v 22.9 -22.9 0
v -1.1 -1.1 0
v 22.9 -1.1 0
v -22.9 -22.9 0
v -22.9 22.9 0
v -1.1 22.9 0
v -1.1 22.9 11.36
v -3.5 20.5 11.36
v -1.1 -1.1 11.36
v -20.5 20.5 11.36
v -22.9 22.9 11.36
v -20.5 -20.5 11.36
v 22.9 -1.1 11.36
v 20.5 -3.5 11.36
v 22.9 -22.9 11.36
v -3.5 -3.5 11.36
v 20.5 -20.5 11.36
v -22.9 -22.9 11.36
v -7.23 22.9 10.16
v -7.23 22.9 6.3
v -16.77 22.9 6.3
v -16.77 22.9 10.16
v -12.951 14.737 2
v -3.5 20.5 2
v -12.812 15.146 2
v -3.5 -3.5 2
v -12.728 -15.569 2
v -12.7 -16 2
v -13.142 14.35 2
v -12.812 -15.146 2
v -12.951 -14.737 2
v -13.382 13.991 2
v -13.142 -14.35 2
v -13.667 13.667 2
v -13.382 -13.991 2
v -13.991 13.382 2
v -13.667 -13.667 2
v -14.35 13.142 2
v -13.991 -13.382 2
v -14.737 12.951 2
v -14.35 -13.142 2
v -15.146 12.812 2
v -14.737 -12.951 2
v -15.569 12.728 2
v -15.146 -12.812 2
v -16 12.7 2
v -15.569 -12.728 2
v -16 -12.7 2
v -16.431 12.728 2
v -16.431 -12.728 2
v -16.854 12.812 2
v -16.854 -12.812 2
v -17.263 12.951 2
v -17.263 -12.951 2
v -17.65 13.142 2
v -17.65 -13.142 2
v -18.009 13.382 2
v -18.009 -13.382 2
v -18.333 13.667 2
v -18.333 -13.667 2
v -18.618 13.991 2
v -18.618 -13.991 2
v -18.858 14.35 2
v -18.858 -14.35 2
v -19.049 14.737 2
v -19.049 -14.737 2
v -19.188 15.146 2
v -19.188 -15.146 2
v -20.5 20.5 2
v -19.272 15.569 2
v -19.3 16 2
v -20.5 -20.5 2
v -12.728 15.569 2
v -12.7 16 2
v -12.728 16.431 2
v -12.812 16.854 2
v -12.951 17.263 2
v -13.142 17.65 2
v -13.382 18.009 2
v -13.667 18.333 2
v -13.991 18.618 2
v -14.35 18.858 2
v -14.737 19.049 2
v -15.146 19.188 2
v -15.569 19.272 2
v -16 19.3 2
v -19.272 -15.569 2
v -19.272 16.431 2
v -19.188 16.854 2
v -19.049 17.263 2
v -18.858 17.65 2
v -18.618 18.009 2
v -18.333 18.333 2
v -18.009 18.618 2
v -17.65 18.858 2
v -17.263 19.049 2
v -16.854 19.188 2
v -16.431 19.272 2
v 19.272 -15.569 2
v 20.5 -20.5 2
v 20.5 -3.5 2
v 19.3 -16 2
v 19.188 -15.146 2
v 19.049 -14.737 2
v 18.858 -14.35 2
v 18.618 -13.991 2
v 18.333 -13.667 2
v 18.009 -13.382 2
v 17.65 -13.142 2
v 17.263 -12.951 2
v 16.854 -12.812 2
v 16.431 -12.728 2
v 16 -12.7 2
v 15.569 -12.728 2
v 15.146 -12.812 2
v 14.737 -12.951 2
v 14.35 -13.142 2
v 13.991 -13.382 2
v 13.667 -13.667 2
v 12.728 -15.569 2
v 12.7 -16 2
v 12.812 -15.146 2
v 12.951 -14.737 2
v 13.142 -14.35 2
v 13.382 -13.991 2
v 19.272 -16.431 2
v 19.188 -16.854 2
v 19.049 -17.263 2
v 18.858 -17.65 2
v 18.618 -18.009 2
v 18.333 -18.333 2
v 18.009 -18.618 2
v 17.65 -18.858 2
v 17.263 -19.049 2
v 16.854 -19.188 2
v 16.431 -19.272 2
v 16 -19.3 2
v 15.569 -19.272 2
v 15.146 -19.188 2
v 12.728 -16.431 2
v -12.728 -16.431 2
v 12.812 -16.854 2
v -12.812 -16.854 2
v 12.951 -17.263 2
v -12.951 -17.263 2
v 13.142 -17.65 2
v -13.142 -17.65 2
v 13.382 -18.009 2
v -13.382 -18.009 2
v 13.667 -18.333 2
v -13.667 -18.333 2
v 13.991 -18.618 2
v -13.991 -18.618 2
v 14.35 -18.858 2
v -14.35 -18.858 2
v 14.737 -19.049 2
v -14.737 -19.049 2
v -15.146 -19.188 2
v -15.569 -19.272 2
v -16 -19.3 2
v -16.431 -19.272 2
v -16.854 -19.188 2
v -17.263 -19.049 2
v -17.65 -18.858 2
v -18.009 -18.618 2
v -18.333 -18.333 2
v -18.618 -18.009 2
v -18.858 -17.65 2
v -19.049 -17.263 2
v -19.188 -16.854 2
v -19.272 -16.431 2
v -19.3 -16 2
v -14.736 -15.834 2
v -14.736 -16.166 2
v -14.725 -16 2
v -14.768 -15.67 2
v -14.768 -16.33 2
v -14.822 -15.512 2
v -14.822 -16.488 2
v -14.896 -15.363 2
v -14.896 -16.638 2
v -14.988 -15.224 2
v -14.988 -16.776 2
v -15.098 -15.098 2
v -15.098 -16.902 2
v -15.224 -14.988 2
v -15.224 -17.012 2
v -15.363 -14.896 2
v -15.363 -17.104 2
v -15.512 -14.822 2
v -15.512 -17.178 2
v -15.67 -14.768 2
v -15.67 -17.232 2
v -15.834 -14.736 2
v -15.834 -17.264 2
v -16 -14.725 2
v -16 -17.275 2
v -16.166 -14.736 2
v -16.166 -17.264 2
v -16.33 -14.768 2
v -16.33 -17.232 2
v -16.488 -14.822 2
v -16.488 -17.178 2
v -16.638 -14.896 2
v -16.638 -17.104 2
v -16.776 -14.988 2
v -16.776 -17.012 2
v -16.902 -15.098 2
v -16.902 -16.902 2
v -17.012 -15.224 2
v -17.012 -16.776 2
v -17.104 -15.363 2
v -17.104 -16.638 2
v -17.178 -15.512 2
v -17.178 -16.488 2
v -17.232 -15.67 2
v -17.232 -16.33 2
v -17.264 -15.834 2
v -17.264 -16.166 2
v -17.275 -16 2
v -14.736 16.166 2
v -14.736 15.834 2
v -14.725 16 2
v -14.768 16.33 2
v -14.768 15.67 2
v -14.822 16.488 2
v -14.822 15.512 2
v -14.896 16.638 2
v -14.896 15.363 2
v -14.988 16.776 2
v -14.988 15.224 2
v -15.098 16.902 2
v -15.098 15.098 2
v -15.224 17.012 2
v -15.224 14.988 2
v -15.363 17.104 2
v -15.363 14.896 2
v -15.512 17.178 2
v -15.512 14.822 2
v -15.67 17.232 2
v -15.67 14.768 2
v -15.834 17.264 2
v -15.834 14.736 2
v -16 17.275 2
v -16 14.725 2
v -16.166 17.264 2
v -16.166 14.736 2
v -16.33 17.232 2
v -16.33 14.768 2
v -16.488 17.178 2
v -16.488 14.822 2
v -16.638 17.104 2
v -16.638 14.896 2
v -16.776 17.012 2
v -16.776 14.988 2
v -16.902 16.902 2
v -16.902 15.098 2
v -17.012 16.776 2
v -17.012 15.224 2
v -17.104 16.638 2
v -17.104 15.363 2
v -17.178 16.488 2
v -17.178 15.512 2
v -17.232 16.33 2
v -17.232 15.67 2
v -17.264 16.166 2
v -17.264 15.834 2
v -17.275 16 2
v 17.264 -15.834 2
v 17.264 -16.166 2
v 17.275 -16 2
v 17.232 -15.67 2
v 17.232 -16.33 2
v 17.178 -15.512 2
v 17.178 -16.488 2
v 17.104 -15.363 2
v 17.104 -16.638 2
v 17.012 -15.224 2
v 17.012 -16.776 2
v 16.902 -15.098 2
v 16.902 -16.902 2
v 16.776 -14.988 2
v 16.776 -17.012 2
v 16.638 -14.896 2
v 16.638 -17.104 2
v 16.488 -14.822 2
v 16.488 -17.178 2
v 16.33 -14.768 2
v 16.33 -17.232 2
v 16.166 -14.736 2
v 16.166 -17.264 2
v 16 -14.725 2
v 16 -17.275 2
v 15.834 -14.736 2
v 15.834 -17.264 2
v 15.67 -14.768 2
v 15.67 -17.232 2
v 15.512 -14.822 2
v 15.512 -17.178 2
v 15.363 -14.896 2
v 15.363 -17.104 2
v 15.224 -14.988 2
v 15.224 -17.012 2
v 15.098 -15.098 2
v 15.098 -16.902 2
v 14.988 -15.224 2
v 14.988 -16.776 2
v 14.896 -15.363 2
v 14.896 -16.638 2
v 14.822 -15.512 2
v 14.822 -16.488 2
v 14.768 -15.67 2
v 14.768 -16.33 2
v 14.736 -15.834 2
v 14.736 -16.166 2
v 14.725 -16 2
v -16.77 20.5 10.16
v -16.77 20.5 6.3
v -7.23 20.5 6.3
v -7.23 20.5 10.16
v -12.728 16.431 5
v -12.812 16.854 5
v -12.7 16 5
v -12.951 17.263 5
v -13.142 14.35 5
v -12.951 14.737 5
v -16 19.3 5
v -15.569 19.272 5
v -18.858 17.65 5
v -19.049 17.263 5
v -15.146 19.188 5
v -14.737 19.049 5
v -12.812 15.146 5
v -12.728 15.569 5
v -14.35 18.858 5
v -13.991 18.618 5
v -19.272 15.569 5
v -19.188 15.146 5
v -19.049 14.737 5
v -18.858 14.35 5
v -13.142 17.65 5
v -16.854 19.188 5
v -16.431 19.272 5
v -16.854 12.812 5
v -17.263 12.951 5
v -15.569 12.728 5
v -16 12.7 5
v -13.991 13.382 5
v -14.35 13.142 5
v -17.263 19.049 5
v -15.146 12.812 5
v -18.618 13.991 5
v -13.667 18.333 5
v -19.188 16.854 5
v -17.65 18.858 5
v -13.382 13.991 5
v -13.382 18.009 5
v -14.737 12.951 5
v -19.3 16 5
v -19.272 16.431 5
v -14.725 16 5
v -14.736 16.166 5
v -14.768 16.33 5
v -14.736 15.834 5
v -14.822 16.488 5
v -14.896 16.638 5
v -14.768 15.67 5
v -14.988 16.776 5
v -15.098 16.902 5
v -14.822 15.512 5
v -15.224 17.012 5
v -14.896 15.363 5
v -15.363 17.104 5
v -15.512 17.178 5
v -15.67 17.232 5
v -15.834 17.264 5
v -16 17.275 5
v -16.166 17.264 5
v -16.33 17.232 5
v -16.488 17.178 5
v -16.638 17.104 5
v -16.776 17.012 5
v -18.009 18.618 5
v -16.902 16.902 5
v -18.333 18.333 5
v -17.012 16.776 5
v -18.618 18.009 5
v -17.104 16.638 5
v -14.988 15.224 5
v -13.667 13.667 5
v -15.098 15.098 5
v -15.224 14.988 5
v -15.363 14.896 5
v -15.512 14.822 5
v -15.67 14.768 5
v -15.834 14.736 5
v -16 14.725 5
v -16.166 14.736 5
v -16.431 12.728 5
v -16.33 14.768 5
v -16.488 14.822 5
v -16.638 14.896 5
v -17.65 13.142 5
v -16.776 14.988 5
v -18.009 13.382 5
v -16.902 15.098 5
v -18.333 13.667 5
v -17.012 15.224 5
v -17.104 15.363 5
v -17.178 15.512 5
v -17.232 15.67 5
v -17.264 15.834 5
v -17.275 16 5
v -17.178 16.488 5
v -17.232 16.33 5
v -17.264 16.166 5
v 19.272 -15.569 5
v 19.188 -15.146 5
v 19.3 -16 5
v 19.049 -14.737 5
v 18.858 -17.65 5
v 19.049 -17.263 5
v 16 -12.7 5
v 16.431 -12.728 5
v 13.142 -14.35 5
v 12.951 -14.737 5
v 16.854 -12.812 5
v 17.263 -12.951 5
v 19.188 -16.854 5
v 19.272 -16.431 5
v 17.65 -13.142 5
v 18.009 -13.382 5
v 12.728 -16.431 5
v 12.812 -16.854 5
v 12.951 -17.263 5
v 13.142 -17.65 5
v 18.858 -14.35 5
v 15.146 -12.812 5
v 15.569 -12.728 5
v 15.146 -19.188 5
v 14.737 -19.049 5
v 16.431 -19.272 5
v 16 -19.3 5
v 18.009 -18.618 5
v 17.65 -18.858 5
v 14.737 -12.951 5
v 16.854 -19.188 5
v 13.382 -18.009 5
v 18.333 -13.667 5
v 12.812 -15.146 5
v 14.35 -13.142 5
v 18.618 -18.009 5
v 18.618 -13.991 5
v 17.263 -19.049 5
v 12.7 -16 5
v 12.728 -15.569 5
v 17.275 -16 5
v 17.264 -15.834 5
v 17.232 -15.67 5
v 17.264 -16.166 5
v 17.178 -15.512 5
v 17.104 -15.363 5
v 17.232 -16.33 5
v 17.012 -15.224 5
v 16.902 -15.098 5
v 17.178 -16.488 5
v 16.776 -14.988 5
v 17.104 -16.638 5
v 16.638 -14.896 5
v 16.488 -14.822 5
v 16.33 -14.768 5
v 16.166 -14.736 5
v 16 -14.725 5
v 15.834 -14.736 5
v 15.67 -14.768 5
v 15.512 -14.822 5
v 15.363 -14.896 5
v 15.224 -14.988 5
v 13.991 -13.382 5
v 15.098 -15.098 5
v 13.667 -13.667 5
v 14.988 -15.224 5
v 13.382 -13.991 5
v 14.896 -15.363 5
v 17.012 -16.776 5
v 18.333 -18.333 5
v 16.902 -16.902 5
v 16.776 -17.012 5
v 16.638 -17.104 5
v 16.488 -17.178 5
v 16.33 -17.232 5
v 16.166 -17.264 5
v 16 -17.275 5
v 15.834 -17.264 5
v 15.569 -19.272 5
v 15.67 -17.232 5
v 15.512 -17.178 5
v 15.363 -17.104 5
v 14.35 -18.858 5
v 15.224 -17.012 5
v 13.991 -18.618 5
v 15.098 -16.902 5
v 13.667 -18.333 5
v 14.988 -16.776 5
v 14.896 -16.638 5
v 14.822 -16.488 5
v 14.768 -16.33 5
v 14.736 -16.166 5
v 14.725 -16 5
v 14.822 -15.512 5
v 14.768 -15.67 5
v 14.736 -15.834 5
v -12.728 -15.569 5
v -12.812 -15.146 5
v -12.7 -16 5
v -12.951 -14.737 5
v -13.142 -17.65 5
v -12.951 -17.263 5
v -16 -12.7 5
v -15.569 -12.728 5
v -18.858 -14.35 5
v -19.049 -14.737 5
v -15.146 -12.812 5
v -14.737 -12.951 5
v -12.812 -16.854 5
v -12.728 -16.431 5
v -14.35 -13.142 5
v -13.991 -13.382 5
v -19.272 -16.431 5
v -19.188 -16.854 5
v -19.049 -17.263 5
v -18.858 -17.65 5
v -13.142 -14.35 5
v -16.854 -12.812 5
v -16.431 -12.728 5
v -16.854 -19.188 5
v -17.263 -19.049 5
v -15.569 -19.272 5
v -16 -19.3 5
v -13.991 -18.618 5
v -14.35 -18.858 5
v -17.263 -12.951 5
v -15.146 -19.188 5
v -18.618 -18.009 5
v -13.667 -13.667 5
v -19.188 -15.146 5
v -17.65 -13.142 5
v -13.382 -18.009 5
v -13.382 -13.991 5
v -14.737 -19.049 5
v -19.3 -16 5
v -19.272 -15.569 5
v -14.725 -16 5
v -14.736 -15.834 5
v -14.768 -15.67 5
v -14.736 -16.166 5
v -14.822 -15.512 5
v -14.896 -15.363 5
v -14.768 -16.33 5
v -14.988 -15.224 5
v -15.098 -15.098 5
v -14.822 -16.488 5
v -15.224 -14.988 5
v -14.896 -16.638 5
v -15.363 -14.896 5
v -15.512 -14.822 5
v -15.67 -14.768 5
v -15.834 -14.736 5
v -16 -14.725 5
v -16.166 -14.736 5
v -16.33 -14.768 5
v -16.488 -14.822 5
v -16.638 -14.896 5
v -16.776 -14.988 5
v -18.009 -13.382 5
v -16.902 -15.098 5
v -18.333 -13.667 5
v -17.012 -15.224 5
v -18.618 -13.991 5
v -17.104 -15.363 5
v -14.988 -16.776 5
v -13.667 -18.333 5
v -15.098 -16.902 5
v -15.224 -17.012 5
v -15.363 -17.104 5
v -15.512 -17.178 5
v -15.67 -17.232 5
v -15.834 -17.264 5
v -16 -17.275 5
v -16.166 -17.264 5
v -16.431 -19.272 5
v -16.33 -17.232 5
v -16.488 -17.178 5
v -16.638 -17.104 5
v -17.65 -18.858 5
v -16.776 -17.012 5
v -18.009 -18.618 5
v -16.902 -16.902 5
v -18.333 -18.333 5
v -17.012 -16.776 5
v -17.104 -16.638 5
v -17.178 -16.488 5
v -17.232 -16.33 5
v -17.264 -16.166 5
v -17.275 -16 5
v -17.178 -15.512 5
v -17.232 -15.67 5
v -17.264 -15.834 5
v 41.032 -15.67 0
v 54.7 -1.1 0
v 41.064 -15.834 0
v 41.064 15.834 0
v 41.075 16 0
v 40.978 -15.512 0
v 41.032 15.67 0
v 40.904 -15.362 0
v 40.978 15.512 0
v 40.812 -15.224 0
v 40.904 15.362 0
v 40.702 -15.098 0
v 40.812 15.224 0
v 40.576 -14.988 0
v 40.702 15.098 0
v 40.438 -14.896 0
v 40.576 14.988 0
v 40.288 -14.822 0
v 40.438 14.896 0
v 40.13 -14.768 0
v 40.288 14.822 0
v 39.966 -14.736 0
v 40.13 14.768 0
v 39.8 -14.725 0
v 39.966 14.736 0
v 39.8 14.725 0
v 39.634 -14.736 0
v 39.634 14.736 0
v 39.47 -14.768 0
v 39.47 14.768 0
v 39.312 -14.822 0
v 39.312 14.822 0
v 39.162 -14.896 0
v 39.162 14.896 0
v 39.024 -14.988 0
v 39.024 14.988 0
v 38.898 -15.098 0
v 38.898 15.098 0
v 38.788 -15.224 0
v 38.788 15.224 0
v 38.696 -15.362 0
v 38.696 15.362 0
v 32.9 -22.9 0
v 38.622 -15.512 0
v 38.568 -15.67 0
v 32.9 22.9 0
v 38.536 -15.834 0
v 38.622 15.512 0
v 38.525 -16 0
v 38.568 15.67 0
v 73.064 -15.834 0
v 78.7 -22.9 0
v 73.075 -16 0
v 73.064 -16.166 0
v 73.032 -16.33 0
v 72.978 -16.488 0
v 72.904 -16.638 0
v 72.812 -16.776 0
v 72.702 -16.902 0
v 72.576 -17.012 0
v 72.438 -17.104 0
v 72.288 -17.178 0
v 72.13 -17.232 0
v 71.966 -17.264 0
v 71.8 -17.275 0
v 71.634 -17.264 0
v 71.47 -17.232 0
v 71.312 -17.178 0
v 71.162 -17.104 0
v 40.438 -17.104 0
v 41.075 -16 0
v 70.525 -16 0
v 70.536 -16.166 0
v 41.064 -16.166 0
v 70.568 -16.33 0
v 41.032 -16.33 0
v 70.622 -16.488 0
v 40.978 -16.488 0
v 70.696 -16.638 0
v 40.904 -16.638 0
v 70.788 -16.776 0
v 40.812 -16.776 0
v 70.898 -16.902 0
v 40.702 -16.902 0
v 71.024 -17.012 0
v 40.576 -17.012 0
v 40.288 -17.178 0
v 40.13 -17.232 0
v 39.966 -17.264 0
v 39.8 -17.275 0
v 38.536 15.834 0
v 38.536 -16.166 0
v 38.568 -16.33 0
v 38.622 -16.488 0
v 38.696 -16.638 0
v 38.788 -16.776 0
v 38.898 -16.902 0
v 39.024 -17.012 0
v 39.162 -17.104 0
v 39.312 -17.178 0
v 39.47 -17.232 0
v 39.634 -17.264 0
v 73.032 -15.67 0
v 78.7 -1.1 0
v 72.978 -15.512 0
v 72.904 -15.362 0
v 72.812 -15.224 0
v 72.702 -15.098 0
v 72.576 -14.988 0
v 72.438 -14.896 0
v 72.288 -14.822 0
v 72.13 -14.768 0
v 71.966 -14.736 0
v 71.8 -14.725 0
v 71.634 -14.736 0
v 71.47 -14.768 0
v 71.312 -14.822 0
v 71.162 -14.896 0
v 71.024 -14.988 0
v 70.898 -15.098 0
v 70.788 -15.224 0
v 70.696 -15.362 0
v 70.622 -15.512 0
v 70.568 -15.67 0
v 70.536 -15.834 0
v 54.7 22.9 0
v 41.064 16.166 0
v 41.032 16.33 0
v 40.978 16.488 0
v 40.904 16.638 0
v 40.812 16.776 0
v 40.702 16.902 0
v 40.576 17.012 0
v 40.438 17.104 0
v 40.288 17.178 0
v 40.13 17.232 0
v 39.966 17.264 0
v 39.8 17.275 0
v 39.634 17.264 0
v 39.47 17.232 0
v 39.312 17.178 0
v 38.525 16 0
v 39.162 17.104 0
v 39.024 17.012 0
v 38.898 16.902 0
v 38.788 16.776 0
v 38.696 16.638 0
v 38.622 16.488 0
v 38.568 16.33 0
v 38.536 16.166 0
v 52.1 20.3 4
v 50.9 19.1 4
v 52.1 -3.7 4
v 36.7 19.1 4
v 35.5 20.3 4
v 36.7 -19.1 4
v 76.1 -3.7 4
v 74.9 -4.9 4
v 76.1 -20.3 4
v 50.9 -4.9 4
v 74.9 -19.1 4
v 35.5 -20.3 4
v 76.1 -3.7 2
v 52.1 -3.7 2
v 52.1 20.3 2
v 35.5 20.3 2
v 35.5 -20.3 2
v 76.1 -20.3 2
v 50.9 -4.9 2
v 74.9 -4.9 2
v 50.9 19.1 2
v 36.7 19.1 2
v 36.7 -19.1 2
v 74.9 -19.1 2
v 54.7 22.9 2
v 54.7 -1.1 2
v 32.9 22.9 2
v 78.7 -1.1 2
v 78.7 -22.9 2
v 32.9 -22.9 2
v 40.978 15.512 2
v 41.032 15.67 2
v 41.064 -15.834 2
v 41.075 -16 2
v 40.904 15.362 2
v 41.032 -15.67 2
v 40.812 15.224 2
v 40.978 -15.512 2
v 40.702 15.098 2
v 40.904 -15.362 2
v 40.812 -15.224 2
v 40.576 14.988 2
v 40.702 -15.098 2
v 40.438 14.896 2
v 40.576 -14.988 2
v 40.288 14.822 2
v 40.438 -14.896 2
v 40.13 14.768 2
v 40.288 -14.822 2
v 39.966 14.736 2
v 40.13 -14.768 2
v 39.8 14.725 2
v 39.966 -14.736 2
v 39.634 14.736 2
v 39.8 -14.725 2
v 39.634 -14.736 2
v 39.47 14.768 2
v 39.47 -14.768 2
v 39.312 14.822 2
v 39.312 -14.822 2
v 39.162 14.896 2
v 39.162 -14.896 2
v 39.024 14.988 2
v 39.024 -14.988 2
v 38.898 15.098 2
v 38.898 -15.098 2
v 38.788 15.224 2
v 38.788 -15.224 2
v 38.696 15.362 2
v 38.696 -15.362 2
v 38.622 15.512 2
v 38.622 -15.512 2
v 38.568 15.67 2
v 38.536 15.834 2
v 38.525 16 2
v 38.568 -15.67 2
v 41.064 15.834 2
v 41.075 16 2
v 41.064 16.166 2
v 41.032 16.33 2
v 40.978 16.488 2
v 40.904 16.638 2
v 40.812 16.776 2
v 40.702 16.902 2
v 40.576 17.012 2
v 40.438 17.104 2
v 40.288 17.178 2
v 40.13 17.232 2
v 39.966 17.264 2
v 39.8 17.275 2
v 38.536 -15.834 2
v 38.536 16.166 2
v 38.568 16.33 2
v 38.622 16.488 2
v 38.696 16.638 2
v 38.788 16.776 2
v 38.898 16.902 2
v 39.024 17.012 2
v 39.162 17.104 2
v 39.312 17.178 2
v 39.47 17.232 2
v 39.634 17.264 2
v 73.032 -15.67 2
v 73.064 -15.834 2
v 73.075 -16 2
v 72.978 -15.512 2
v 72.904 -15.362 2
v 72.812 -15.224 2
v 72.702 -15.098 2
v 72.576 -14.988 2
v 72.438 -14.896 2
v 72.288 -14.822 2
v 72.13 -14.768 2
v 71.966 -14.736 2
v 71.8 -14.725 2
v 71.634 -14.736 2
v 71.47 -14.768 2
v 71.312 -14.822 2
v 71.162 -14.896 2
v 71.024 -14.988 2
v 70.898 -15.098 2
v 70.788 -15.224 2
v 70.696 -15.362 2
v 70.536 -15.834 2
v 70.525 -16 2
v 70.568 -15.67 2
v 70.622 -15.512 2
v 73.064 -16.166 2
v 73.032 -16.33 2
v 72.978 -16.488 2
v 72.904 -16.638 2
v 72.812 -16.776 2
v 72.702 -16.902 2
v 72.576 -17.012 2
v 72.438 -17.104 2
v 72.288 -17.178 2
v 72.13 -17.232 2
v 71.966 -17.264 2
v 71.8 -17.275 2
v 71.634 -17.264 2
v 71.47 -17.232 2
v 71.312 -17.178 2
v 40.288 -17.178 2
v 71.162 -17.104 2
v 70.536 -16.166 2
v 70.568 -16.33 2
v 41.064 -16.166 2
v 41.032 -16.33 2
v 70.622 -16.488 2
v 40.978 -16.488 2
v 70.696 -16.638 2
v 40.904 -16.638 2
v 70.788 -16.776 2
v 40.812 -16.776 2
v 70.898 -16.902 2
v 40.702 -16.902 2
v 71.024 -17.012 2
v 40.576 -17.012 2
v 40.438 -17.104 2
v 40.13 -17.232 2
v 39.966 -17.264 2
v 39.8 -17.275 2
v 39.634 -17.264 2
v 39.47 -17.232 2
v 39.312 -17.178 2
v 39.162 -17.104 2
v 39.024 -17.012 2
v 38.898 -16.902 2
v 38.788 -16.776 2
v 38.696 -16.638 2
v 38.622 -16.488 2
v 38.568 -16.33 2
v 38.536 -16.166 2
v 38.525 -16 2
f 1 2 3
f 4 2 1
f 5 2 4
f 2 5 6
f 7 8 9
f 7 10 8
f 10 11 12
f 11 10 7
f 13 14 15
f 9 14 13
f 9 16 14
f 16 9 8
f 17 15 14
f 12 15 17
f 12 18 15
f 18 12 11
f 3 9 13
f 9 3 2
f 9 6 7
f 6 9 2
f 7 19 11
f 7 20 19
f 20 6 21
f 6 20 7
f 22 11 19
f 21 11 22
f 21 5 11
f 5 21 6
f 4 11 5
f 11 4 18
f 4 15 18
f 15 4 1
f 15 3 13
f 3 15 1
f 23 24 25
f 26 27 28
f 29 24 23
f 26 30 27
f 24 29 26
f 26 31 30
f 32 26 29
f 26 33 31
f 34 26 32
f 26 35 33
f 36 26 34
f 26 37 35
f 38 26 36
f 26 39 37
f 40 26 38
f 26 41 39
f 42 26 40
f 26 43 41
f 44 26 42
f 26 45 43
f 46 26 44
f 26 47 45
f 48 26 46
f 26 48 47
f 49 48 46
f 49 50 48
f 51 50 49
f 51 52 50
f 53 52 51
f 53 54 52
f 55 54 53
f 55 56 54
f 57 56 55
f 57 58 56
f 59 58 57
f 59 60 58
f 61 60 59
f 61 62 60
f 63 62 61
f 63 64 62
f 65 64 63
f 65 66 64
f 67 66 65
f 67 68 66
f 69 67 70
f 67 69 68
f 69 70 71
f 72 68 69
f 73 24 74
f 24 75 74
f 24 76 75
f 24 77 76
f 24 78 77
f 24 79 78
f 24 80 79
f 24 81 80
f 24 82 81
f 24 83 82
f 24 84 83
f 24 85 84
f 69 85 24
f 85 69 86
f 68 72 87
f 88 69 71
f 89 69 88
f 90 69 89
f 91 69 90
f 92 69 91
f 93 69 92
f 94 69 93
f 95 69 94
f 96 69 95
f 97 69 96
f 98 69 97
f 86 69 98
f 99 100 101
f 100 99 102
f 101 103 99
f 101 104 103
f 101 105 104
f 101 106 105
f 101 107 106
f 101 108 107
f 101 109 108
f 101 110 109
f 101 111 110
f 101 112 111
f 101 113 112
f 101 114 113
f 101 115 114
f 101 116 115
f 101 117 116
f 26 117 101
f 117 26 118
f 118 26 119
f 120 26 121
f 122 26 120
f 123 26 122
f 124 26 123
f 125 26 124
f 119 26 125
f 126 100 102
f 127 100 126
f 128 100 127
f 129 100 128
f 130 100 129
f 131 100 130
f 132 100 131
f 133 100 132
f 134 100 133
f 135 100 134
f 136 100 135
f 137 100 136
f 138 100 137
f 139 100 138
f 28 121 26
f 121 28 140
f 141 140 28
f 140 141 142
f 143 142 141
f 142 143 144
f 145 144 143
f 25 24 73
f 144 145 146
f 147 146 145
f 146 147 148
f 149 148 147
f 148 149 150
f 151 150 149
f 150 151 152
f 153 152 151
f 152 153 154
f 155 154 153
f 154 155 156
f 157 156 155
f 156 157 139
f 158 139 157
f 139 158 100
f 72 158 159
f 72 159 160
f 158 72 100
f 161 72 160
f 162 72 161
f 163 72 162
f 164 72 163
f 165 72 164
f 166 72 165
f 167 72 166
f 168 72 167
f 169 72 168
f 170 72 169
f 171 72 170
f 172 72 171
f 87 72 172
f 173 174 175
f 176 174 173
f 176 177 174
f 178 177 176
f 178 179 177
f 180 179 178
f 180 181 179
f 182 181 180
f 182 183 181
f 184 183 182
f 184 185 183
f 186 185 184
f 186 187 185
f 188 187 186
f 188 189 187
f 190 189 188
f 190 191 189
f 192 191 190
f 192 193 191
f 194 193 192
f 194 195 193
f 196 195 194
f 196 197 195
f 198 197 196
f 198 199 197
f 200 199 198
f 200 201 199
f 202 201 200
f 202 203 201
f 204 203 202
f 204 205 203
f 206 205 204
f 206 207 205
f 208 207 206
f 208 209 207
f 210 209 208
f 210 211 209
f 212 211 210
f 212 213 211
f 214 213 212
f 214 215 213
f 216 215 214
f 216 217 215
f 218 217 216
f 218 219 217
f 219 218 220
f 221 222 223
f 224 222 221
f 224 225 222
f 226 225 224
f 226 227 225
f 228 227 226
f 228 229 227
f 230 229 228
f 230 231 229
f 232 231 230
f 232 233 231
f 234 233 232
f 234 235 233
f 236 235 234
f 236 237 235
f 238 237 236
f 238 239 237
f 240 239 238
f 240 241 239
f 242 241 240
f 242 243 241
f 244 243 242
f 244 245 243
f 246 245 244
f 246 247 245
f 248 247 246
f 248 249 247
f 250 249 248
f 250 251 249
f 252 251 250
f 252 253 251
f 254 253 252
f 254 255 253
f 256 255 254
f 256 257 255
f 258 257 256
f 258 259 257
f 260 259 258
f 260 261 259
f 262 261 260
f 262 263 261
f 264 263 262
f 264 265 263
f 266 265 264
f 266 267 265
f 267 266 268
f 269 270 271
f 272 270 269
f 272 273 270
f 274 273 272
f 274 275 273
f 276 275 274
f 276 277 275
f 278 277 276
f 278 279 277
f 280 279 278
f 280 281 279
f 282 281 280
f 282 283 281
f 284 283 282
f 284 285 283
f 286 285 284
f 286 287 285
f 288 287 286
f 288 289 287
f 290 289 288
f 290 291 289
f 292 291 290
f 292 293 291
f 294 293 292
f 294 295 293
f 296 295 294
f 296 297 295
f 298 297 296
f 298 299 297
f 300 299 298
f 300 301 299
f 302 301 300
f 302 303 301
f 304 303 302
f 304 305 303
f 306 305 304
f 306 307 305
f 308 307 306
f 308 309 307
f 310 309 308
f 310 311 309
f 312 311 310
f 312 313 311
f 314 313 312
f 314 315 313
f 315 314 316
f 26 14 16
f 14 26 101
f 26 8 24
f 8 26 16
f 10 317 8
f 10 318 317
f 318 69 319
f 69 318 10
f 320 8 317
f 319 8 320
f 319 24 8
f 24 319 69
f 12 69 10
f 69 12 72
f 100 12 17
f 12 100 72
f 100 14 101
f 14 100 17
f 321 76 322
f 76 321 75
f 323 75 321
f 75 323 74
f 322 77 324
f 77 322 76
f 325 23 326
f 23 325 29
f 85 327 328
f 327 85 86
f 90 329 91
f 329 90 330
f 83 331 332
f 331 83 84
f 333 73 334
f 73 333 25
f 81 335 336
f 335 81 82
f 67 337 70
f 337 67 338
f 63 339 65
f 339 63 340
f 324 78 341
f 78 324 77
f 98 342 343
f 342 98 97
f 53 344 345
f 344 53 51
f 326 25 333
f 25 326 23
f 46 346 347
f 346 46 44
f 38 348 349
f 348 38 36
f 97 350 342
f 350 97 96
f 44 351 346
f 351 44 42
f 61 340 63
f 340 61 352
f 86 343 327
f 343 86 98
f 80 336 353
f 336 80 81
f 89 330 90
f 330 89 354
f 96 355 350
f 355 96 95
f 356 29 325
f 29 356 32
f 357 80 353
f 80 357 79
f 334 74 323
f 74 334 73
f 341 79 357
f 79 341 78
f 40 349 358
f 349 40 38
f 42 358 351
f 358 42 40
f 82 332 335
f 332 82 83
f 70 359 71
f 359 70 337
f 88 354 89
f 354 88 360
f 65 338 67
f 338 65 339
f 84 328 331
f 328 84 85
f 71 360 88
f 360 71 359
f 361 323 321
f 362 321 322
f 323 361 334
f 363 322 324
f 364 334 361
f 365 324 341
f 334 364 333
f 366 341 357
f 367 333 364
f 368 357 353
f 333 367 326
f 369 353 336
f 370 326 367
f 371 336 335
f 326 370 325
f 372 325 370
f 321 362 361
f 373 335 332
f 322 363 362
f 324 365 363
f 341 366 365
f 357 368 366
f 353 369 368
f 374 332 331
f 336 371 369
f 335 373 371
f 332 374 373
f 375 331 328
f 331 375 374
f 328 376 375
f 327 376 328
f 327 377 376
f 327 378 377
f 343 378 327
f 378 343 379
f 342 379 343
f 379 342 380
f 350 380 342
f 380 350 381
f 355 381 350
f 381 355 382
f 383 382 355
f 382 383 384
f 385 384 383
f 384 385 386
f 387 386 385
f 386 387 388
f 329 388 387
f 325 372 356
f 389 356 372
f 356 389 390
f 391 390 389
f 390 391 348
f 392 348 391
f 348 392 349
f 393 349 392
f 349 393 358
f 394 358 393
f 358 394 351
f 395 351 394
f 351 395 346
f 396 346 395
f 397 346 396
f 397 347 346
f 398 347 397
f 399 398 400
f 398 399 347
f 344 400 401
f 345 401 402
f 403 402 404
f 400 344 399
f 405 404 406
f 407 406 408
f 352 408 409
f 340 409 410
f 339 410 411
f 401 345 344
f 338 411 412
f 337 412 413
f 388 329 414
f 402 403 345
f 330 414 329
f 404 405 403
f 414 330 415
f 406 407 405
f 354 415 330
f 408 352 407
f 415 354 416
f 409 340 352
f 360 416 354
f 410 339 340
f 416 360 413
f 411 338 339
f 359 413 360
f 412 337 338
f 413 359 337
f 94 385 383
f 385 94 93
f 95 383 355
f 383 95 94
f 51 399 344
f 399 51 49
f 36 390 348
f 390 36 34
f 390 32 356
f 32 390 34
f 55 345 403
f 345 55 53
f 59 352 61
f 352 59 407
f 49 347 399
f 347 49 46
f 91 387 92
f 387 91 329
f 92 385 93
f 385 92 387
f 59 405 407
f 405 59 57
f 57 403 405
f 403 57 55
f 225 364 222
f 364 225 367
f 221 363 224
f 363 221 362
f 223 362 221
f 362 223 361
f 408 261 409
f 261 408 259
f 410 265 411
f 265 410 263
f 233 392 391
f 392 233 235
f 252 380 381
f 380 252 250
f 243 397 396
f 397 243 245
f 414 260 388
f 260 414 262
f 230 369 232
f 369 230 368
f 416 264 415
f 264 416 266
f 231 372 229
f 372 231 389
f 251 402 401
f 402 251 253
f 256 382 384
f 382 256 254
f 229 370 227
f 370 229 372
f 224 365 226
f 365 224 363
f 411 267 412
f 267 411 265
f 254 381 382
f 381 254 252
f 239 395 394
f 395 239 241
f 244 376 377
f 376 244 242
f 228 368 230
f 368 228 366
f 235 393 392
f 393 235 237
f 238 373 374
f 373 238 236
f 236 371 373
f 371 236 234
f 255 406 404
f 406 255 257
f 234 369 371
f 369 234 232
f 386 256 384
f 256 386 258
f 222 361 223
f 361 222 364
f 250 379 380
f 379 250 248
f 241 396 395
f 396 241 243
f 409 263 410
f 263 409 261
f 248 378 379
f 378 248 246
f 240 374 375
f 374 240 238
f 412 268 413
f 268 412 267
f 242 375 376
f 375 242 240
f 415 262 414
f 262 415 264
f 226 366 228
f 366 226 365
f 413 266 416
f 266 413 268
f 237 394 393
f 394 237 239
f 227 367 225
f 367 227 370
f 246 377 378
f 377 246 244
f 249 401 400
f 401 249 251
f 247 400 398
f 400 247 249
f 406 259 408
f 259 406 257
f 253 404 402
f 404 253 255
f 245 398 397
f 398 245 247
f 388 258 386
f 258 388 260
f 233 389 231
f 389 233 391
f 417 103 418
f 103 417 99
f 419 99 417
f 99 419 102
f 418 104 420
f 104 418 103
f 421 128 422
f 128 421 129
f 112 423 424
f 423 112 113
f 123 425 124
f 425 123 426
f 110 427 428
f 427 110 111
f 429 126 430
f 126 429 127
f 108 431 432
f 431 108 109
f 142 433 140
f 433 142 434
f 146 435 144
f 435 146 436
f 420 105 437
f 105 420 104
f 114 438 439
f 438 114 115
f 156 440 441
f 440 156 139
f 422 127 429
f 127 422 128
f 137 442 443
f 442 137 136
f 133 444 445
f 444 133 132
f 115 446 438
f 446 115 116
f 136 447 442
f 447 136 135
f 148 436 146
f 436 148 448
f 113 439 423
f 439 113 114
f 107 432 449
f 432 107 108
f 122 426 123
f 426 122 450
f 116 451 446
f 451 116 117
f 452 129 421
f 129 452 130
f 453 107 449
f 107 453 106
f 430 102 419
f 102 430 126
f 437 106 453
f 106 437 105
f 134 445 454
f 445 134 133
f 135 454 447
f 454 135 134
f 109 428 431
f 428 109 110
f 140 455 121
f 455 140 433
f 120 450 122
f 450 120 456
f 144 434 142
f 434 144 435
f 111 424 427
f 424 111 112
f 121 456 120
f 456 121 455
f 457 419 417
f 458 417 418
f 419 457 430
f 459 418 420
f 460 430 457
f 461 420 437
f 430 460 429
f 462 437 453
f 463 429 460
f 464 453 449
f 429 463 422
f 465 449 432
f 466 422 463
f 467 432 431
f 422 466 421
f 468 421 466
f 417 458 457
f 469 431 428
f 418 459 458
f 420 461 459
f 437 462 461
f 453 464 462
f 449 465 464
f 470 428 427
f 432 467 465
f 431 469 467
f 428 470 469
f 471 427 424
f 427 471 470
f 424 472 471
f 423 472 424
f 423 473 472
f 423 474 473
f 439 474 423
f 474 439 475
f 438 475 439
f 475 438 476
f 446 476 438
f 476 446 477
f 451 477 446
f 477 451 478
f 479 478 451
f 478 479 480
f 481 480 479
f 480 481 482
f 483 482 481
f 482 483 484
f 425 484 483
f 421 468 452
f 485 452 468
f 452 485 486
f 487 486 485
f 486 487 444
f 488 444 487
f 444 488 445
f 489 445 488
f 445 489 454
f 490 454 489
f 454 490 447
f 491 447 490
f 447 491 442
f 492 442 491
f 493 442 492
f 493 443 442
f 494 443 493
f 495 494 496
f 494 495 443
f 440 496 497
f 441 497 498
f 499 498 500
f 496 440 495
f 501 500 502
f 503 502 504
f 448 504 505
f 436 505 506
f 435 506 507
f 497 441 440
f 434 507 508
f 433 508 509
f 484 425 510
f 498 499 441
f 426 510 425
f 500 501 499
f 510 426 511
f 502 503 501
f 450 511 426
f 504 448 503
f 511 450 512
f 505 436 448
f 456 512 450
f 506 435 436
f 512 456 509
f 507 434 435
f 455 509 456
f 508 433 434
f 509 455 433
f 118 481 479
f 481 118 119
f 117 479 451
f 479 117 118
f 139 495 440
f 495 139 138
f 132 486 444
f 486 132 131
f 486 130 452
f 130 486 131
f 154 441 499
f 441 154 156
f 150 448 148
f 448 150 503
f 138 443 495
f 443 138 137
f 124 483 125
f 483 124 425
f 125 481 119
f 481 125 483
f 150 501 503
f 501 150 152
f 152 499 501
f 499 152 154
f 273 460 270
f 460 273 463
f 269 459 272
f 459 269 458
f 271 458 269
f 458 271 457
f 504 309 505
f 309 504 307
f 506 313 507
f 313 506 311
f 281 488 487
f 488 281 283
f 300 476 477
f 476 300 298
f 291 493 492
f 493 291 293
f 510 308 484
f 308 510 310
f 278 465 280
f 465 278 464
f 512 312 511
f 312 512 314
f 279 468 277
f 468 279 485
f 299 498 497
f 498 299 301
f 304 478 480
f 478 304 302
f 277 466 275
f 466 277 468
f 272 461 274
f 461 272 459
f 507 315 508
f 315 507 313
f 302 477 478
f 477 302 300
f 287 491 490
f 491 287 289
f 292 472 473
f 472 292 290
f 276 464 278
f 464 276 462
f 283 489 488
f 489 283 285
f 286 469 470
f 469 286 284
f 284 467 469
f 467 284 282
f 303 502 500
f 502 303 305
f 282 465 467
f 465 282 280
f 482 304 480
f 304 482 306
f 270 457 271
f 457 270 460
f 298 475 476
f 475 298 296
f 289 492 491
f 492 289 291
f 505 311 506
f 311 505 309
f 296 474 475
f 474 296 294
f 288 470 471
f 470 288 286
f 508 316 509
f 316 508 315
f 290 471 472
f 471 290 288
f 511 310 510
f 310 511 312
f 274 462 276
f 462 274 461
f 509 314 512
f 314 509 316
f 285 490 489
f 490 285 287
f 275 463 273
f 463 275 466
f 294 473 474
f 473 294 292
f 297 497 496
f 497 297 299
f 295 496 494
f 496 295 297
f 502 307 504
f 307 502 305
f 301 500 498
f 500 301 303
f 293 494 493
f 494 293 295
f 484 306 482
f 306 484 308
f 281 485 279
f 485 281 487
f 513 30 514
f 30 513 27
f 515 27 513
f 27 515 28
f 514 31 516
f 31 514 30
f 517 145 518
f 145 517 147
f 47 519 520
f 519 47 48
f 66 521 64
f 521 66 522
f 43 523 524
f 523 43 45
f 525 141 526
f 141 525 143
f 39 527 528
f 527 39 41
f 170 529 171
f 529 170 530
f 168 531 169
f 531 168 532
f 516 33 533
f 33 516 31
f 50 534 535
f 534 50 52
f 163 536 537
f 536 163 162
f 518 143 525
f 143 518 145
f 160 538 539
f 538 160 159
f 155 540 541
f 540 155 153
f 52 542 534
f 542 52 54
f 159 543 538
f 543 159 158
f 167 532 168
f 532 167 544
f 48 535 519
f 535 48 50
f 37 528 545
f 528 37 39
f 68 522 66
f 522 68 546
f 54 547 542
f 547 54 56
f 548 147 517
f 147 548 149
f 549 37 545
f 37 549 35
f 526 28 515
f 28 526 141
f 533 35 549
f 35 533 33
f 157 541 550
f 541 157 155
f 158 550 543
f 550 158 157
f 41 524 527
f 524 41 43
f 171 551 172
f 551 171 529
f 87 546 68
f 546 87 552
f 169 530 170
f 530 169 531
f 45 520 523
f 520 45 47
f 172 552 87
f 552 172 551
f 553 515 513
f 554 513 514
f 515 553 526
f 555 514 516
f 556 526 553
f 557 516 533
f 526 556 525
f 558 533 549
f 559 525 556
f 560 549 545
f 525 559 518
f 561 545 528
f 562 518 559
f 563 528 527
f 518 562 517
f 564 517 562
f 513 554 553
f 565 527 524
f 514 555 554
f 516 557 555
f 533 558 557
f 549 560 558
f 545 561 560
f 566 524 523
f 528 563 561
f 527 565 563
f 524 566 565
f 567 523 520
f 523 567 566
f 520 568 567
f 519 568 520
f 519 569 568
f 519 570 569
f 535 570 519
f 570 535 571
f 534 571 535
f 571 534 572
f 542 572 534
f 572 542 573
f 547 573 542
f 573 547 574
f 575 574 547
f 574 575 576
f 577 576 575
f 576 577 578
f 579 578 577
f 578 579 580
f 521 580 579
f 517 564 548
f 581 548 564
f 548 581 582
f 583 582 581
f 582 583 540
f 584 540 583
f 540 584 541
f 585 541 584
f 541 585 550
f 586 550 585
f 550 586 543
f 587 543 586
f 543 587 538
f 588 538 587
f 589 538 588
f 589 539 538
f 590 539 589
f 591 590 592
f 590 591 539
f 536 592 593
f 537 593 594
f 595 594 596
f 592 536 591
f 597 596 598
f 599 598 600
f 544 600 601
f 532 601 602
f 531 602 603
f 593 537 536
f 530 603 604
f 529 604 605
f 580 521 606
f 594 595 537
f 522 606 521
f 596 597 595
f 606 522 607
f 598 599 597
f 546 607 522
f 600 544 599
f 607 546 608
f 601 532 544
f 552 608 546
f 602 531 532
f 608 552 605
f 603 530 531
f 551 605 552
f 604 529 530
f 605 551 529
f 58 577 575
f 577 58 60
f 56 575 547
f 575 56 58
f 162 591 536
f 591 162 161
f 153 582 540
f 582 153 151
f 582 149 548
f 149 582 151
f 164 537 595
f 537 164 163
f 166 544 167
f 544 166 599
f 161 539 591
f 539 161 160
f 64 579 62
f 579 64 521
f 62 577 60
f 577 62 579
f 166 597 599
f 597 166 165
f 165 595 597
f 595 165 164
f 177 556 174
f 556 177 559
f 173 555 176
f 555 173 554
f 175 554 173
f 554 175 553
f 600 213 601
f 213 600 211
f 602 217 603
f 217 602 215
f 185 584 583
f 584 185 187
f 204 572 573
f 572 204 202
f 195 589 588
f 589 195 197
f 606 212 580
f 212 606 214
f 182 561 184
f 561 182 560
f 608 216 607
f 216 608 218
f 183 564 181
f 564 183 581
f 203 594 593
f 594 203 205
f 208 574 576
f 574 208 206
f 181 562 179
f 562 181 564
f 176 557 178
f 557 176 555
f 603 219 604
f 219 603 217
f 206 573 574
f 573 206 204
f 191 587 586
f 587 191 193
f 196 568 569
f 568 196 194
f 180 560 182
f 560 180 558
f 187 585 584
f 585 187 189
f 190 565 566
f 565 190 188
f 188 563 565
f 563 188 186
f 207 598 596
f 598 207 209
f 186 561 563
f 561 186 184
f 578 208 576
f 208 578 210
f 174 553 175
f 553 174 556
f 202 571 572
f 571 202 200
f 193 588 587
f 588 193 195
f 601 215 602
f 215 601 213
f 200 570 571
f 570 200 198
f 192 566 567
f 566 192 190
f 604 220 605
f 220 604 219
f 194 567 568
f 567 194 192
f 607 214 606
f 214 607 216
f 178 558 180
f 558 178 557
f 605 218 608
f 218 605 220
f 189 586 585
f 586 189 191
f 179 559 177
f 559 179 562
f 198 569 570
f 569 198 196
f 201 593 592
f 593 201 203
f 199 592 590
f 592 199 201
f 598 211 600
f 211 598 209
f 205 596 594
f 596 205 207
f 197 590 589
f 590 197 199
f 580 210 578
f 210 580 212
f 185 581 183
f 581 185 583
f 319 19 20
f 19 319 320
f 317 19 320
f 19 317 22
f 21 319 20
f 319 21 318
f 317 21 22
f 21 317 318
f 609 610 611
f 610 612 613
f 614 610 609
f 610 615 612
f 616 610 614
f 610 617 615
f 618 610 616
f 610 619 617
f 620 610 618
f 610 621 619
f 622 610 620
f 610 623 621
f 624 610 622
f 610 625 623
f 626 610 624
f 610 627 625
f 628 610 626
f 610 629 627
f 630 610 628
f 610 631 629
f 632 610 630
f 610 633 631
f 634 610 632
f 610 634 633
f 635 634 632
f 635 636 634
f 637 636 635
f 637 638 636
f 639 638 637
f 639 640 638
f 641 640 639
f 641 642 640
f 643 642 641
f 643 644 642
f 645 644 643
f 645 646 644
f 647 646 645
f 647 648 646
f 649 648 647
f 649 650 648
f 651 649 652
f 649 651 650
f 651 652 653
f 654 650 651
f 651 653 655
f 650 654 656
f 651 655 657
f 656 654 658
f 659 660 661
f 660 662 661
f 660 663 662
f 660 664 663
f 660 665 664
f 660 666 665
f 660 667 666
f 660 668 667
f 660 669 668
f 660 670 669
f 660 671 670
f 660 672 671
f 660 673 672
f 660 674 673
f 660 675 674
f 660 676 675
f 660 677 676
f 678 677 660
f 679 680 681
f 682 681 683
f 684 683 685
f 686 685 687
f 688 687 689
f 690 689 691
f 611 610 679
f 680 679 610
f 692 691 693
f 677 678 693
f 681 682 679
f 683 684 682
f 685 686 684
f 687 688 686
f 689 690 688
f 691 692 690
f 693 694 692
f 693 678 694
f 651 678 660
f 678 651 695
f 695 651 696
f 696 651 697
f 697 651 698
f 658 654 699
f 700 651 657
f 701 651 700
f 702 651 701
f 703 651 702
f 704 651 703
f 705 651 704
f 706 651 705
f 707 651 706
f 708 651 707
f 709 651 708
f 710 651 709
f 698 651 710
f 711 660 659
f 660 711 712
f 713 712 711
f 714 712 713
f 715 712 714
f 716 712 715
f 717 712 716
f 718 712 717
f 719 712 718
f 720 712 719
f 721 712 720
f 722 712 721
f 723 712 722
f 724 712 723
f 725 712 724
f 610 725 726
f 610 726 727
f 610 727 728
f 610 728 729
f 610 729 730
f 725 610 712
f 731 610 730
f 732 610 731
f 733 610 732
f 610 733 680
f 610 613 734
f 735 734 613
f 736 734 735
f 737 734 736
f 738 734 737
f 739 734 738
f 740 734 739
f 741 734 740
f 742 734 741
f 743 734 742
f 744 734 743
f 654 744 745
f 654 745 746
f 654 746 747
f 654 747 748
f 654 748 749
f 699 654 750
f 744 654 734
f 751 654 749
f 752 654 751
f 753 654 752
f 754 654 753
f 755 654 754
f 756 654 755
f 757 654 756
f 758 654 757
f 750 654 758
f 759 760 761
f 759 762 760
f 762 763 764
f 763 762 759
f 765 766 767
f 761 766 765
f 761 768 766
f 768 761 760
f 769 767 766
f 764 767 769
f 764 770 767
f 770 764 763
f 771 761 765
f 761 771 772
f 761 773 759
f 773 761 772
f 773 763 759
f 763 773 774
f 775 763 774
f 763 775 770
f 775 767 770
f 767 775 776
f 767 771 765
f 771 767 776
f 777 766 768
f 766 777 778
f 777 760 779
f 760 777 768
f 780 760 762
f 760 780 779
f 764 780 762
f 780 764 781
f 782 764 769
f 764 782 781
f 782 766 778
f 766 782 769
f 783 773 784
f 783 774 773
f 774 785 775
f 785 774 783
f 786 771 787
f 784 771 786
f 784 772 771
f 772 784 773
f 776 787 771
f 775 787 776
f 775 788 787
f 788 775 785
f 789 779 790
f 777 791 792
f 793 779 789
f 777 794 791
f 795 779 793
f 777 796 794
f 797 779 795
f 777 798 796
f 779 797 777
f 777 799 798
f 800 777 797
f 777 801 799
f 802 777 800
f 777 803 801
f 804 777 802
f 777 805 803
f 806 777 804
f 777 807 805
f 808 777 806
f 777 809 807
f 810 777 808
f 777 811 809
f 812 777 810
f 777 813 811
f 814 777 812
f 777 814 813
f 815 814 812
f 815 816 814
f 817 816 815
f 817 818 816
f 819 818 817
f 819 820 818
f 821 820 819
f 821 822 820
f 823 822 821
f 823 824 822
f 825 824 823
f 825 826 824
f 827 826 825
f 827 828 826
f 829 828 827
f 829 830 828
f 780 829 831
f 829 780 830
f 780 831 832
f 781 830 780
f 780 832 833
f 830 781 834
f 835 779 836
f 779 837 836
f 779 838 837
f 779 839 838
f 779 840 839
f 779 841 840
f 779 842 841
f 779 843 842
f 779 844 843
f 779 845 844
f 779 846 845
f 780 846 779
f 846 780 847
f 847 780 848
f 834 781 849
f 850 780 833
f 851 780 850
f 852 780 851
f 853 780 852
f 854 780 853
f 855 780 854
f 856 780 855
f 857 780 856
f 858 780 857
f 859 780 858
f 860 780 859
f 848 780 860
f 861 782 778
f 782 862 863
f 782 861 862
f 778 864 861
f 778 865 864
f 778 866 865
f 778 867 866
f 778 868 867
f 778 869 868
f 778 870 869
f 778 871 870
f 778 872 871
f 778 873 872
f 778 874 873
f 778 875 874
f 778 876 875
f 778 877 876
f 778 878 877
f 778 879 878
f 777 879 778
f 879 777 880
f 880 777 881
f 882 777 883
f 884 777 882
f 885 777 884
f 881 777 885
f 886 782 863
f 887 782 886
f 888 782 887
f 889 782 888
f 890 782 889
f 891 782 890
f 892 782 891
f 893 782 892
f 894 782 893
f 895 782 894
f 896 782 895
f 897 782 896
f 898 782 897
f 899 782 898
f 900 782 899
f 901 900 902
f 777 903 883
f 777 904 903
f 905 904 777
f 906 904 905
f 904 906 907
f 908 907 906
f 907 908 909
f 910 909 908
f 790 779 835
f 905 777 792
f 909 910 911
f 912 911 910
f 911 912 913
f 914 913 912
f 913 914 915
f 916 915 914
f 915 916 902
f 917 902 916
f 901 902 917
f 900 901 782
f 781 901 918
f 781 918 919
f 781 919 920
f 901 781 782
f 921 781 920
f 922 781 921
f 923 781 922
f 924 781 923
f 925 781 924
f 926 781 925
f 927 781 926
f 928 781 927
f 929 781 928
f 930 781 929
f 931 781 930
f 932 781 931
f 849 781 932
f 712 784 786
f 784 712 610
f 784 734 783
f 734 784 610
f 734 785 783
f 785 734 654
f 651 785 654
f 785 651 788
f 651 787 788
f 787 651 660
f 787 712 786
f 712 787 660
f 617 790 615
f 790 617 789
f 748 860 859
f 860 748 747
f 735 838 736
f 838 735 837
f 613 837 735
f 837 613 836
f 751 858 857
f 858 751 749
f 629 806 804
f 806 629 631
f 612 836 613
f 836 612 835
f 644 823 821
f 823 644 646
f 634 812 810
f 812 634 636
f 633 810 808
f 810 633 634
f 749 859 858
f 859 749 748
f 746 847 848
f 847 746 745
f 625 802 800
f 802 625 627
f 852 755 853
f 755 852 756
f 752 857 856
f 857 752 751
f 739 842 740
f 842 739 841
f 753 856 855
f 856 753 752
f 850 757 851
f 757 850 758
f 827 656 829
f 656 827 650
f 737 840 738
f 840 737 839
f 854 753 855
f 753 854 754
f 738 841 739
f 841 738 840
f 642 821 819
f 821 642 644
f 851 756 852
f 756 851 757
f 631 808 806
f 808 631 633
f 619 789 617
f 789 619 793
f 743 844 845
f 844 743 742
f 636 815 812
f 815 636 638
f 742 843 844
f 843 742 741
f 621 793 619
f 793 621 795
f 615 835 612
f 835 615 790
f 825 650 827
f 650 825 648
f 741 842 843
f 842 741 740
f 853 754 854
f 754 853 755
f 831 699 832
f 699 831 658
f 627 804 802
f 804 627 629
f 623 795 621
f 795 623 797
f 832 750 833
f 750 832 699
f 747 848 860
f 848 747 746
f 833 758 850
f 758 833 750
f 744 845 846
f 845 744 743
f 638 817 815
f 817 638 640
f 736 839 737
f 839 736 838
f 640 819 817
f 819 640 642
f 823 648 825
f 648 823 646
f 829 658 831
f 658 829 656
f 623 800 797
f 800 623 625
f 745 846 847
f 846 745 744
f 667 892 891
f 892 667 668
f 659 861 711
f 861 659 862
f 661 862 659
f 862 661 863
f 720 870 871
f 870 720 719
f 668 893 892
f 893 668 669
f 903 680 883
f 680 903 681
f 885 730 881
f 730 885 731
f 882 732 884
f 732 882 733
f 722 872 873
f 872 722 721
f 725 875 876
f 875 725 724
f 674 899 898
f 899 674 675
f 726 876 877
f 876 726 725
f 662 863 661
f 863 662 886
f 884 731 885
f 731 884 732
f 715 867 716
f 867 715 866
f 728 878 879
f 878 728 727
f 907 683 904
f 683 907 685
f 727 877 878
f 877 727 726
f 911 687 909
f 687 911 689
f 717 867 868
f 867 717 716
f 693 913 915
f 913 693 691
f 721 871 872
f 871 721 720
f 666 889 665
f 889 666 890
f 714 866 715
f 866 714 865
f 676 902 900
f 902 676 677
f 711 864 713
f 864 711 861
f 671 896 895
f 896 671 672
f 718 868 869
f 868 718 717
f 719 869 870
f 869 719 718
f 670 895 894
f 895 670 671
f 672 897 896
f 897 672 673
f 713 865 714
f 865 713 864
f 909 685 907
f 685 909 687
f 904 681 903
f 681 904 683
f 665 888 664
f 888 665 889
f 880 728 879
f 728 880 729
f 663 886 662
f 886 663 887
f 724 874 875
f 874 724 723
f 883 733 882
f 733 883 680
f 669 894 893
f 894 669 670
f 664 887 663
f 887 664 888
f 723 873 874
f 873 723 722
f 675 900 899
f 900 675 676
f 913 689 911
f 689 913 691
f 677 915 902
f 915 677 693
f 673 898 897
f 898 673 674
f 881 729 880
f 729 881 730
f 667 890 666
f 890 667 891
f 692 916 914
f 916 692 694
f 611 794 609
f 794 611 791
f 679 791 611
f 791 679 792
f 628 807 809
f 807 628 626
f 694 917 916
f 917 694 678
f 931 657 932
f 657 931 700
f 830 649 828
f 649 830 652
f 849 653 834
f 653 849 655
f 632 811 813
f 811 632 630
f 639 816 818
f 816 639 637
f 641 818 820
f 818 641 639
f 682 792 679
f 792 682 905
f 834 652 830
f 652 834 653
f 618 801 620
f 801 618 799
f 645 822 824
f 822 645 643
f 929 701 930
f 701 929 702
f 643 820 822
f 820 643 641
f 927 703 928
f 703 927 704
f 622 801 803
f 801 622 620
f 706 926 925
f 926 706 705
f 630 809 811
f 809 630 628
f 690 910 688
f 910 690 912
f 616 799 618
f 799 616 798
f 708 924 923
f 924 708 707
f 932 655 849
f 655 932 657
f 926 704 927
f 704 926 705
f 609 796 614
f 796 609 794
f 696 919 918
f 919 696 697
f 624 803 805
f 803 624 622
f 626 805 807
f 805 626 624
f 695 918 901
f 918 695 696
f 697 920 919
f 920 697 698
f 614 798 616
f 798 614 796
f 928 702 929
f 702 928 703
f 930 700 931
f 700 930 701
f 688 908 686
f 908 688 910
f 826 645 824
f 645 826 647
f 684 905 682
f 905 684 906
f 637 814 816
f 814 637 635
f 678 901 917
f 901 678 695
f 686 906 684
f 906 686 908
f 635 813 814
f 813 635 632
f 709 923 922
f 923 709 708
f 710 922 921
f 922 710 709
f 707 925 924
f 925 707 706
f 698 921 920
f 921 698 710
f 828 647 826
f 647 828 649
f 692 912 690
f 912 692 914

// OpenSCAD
// l-shape: enclosure
// Generated by boardforge from the board file. Every number below is either a parameter you can
// edit and re-render, or derived from the board (regenerate the case to change those).
// Plain OpenSCAD, no libraries, so it opens in the Customizer and in web playgrounds.
// Coordinates are the board's own, y up. z = 0 is the outside of the case floor.

/* [Case] */
wall_thickness  = 2.4;   // [1.2:0.2:5] wall around the board
floor_thickness = 2;   // [1:0.2:5]
margin          = 0.2;   // [0:0.1:3] design gap between the board edge and the inside of the wall
lid_thickness   = 2;   // [1:0.2:5]
/* [Board fit] */
standoff_height = 3;   // [1:0.5:12] the board floats this far above the floor
headroom        = 1.5;   // [0.5:0.5:10] air above the tallest part
/* [Mounting] */
screw_size      = 2.2;   // [2:0.1:3.4] drill diameter (M2 = 2.2, M2.5 = 2.7, M3 = 3.2)
lip_height      = 2;   // [0:0.5:6] how far the lid's locating lip drops into the tray (0 = flat joint)
lip_thickness   = 1.2;   // [0.8:0.2:3] wall of that lip
/* [Print tolerances: fdm] */
// A printer does not make exact sizes. These are added to the drawn dimensions so real parts fit.
// Calibrate with a test print, then change these. All zero = exact CAD dimensions.
tol_slip         = 0.3;   // [0:0.05:1] extra room around the PCB so it drops in
tol_opening      = 0.3;   // [0:0.05:1] extra room around every connector opening
tol_screw_hole   = 0.2;   // [0:0.05:0.6] extra diameter for a screw to pass
tol_vertical_hole = 0.15;   // [0:0.05:0.5] holes printed upright close up, so they get more
tol_mating      = 0.2;   // [0:0.05:0.6] gap between the lid's lip and the tray
opening_clearance = tol_opening;
/* [Layout] */
part_gap        = 10;   // [0:1:40] space between the two printed parts

/* [Hidden] */
$fn = 48;
board_thickness = 1.6;   // from the board
tallest_top     = 3.26;   // tallest part on the top side
tray_height     = floor_thickness + standoff_height + board_thickness + tallest_top + headroom;
standoff_radius = screw_size / 2 + 2.2;
screw_hole      = screw_size + tol_screw_hole + tol_vertical_hole;   // = 2.55 at the current settings
gap             = margin + tol_slip;   // total board-to-wall gap: design gap + print gap
wall_offset     = gap + wall_thickness;

// the board outline, exactly as in the board file
module board_outline() {
  polygon([[-20, -20], [20, -20], [20, -4], [-4, -4], [-4, 20], [-20, 20]]);
}
module board_cutouts() {
  // none
}

// the cavity is the outline grown by the gap; the outer shell is the cavity grown by the wall
module cavity_2d() { offset(delta = gap) board_outline(); }
module shell_2d()  { offset(delta = wall_offset) board_outline(); }

module standoff(x, y) {
  translate([x, y, floor_thickness - 0.01])
    difference() {
      cylinder(h = standoff_height + 0.01, r = standoff_radius);
      translate([0, 0, -1]) cylinder(h = standoff_height + 2, d = screw_hole);
    }
}
module standoffs() {
  standoff(-16, 16);   // H1
  standoff(16, -16);   // H2
  standoff(-16, -16);   // H3
}

module edge_openings() {
  // J1: USB-C, y+ wall
  translate([-12 - (8.94 + 2 * opening_clearance) / 2, 20 + gap - 1, floor_thickness + standoff_height + board_thickness + 0 - opening_clearance]) cube([8.94 + 2 * opening_clearance, wall_offset + 2, 3.26 + 2 * opening_clearance]);
}

module case_bottom() {
  difference() {
    union() {
      difference() {
        linear_extrude(tray_height) shell_2d();
        translate([0, 0, floor_thickness]) linear_extrude(tray_height) cavity_2d();
      }
      standoffs();
    }
    edge_openings();
  }
}

module top_openings() {
  // none
}

// The lid locates on the tray with a lip that drops into the cavity. The lip is the cavity outline
// shrunk by the mating gap (so it slides in) and hollowed to lip_thickness (so it is a rim, not a plug).
module lid_lip() {
  if (lip_height > 0)
    difference() {
      linear_extrude(lid_thickness + lip_height) offset(delta = -tol_mating) cavity_2d();
      translate([0, 0, -1]) linear_extrude(lid_thickness + lip_height + 2) offset(delta = -(tol_mating + lip_thickness)) cavity_2d();
    }
}

// The lid is built upside down (flat face on the bed) with the lip pointing up, which is how it prints.
module case_lid() {
  difference() {
    union() {
      linear_extrude(lid_thickness) shell_2d();
      lid_lip();
    }
    translate([-16, 16, -1]) cylinder(h = lid_thickness + lip_height + 2, d = screw_hole);   // H1
    translate([16, -16, -1]) cylinder(h = lid_thickness + lip_height + 2, d = screw_hole);   // H2
    translate([-16, -16, -1]) cylinder(h = lid_thickness + lip_height + 2, d = screw_hole);   // H3
    top_openings();
  }
}

// ---- print both: the lid is laid beside the tray
case_bottom();
translate([40 + 2 * wall_offset + part_gap, 0, 0]) case_lid();
